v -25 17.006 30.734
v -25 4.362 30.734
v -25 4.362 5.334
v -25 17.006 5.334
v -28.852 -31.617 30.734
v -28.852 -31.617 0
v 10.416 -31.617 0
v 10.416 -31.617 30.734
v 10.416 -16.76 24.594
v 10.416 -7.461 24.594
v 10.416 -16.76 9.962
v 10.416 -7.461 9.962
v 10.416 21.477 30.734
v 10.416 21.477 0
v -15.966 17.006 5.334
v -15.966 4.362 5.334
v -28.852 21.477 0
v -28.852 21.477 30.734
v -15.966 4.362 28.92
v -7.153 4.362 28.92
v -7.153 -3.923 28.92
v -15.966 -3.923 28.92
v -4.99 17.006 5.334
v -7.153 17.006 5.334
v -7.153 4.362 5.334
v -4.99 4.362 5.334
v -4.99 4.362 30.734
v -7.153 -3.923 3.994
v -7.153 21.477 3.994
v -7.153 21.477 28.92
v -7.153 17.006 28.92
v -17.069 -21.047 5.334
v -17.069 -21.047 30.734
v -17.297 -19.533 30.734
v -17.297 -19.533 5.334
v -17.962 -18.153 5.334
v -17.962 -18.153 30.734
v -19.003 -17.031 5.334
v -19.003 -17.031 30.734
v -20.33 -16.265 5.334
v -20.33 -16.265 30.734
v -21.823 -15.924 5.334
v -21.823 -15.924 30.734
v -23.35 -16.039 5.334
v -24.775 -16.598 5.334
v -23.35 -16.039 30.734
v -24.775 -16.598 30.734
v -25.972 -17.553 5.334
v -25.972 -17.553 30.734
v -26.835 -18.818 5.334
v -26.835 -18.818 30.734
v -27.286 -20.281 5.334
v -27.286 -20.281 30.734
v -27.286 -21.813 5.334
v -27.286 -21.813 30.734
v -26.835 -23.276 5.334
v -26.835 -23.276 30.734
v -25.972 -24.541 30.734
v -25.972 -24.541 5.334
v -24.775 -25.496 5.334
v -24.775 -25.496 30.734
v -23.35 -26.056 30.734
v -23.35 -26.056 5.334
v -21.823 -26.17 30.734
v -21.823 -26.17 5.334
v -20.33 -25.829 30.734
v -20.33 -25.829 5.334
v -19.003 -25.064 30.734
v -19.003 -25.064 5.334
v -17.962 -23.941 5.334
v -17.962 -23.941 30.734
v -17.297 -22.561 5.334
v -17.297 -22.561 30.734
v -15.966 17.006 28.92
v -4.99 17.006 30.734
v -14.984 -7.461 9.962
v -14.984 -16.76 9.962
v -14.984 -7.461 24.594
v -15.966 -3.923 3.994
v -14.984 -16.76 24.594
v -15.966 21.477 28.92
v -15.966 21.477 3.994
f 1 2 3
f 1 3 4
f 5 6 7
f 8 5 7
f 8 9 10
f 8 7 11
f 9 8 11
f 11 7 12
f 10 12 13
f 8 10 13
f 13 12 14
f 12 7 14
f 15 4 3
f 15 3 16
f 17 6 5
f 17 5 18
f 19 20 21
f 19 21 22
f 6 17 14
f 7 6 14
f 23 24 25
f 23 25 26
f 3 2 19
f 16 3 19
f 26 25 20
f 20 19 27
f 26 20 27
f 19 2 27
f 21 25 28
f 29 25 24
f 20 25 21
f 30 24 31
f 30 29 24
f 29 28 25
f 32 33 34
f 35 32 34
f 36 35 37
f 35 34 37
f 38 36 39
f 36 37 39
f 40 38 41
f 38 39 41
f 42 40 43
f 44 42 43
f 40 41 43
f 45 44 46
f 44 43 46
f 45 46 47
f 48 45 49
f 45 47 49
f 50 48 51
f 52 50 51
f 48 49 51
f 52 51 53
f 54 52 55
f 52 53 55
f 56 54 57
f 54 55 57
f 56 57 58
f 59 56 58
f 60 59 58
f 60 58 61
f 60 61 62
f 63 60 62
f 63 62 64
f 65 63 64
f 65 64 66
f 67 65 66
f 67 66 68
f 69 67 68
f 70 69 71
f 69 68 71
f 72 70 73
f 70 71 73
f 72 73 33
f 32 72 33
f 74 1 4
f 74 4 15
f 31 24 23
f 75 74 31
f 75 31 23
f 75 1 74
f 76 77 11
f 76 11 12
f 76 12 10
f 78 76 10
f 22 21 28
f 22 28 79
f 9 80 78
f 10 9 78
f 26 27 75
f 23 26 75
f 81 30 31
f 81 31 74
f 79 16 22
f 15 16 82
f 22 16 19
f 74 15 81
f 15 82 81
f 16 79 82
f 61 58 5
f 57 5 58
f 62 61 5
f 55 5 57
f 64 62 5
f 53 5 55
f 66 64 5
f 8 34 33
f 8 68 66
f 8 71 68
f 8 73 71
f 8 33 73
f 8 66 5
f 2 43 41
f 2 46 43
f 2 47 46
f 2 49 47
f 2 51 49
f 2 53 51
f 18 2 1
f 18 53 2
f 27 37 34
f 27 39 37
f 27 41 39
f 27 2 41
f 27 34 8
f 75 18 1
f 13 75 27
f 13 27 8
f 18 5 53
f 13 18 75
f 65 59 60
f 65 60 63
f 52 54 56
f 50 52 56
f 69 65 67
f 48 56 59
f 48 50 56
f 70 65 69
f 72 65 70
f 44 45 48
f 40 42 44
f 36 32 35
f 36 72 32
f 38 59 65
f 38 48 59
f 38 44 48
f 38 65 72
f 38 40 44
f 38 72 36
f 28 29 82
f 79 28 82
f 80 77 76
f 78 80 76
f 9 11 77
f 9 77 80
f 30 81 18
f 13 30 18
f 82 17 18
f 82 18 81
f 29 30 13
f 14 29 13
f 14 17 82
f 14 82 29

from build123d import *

# Parameters (mm, degrees)
F0_W      = 39.2675818875
F0_H      = 53.094195202
F1_DEPTH  = 30.734
F2_R      = 5.9033693707
F3_DEPTH  = 34.544
F4_R      = 6.9366562731
F5_DEPTH  = 29.21
F6_R      = 5.137322698
F7_DEPTH  = 25.4
F8_W      = 9.2991222627
F8_H      = 14.6318394691
F9_DEPTH  = 25.4
F10_W     = 8.8133979589
F10_H     = 24.9259229749
F11_DEPTH = 25.4
F12_W     = 20.0094743632
F12_H     = 12.6438736916
F13_DEPTH = 25.4


with BuildPart() as f1:
    # F0 (on Top) → F1 (new body)
    with BuildSketch(Plane.XY):
        with Locations((-9.2177423649, -5.0697578117)):
            Rectangle(F0_W, F0_H)
    extrude(amount=F1_DEPTH)

    # F2 (on face) → F3 (join)
    with BuildSketch(Plane(origin=(0, 21.4773397893, 0), x_dir=(-1, 0, 0), z_dir=(0, 1, 0))):
        with Locations((0, 21.7559281737)):
            Circle(F2_R)
    extrude(amount=-F3_DEPTH)

    # F4 (on face) → F5 (join)
    with BuildSketch(Plane(origin=(0, 21.4773397893, 0), x_dir=(-1, 0, 0), z_dir=(0, 1, 0))):
        with Locations((0, 17.7725534886)):
            Circle(F4_R)
    extrude(amount=-F5_DEPTH)

    # F6 (on face) → F7 (cut)
    with BuildSketch(Plane.XY.offset(30.734)):
        with Locations((-22.2064536065, -21.0470482707)):
            Circle(F6_R)
    extrude(amount=-F7_DEPTH, mode=Mode.SUBTRACT)

    # F8 (on face) → F9 (cut)
    with BuildSketch(Plane.YZ.offset(10.4160485789)):
        with Locations((-12.1103653219, 17.2777241096)):
            Rectangle(F8_W, F8_H)
    extrude(amount=-F9_DEPTH, mode=Mode.SUBTRACT)

    # F10 (on face) → F11 (cut)
    with BuildSketch(Plane(origin=(0, 21.4773397893, 0), x_dir=(-1, 0, 0), z_dir=(0, 1, 0))):
        with Locations((11.5594444796, 16.4570594206)):
            Rectangle(F10_W, F10_H)
    extrude(amount=-F11_DEPTH, mode=Mode.SUBTRACT)

    # F12 (on face) → F13 (cut)
    with BuildSketch(Plane.XY.offset(30.734)):
        with Locations((-14.995142119, 10.6841661036)):
            Rectangle(F12_W, F12_H)
    extrude(amount=-F13_DEPTH, mode=Mode.SUBTRACT)


solid = f1.part
